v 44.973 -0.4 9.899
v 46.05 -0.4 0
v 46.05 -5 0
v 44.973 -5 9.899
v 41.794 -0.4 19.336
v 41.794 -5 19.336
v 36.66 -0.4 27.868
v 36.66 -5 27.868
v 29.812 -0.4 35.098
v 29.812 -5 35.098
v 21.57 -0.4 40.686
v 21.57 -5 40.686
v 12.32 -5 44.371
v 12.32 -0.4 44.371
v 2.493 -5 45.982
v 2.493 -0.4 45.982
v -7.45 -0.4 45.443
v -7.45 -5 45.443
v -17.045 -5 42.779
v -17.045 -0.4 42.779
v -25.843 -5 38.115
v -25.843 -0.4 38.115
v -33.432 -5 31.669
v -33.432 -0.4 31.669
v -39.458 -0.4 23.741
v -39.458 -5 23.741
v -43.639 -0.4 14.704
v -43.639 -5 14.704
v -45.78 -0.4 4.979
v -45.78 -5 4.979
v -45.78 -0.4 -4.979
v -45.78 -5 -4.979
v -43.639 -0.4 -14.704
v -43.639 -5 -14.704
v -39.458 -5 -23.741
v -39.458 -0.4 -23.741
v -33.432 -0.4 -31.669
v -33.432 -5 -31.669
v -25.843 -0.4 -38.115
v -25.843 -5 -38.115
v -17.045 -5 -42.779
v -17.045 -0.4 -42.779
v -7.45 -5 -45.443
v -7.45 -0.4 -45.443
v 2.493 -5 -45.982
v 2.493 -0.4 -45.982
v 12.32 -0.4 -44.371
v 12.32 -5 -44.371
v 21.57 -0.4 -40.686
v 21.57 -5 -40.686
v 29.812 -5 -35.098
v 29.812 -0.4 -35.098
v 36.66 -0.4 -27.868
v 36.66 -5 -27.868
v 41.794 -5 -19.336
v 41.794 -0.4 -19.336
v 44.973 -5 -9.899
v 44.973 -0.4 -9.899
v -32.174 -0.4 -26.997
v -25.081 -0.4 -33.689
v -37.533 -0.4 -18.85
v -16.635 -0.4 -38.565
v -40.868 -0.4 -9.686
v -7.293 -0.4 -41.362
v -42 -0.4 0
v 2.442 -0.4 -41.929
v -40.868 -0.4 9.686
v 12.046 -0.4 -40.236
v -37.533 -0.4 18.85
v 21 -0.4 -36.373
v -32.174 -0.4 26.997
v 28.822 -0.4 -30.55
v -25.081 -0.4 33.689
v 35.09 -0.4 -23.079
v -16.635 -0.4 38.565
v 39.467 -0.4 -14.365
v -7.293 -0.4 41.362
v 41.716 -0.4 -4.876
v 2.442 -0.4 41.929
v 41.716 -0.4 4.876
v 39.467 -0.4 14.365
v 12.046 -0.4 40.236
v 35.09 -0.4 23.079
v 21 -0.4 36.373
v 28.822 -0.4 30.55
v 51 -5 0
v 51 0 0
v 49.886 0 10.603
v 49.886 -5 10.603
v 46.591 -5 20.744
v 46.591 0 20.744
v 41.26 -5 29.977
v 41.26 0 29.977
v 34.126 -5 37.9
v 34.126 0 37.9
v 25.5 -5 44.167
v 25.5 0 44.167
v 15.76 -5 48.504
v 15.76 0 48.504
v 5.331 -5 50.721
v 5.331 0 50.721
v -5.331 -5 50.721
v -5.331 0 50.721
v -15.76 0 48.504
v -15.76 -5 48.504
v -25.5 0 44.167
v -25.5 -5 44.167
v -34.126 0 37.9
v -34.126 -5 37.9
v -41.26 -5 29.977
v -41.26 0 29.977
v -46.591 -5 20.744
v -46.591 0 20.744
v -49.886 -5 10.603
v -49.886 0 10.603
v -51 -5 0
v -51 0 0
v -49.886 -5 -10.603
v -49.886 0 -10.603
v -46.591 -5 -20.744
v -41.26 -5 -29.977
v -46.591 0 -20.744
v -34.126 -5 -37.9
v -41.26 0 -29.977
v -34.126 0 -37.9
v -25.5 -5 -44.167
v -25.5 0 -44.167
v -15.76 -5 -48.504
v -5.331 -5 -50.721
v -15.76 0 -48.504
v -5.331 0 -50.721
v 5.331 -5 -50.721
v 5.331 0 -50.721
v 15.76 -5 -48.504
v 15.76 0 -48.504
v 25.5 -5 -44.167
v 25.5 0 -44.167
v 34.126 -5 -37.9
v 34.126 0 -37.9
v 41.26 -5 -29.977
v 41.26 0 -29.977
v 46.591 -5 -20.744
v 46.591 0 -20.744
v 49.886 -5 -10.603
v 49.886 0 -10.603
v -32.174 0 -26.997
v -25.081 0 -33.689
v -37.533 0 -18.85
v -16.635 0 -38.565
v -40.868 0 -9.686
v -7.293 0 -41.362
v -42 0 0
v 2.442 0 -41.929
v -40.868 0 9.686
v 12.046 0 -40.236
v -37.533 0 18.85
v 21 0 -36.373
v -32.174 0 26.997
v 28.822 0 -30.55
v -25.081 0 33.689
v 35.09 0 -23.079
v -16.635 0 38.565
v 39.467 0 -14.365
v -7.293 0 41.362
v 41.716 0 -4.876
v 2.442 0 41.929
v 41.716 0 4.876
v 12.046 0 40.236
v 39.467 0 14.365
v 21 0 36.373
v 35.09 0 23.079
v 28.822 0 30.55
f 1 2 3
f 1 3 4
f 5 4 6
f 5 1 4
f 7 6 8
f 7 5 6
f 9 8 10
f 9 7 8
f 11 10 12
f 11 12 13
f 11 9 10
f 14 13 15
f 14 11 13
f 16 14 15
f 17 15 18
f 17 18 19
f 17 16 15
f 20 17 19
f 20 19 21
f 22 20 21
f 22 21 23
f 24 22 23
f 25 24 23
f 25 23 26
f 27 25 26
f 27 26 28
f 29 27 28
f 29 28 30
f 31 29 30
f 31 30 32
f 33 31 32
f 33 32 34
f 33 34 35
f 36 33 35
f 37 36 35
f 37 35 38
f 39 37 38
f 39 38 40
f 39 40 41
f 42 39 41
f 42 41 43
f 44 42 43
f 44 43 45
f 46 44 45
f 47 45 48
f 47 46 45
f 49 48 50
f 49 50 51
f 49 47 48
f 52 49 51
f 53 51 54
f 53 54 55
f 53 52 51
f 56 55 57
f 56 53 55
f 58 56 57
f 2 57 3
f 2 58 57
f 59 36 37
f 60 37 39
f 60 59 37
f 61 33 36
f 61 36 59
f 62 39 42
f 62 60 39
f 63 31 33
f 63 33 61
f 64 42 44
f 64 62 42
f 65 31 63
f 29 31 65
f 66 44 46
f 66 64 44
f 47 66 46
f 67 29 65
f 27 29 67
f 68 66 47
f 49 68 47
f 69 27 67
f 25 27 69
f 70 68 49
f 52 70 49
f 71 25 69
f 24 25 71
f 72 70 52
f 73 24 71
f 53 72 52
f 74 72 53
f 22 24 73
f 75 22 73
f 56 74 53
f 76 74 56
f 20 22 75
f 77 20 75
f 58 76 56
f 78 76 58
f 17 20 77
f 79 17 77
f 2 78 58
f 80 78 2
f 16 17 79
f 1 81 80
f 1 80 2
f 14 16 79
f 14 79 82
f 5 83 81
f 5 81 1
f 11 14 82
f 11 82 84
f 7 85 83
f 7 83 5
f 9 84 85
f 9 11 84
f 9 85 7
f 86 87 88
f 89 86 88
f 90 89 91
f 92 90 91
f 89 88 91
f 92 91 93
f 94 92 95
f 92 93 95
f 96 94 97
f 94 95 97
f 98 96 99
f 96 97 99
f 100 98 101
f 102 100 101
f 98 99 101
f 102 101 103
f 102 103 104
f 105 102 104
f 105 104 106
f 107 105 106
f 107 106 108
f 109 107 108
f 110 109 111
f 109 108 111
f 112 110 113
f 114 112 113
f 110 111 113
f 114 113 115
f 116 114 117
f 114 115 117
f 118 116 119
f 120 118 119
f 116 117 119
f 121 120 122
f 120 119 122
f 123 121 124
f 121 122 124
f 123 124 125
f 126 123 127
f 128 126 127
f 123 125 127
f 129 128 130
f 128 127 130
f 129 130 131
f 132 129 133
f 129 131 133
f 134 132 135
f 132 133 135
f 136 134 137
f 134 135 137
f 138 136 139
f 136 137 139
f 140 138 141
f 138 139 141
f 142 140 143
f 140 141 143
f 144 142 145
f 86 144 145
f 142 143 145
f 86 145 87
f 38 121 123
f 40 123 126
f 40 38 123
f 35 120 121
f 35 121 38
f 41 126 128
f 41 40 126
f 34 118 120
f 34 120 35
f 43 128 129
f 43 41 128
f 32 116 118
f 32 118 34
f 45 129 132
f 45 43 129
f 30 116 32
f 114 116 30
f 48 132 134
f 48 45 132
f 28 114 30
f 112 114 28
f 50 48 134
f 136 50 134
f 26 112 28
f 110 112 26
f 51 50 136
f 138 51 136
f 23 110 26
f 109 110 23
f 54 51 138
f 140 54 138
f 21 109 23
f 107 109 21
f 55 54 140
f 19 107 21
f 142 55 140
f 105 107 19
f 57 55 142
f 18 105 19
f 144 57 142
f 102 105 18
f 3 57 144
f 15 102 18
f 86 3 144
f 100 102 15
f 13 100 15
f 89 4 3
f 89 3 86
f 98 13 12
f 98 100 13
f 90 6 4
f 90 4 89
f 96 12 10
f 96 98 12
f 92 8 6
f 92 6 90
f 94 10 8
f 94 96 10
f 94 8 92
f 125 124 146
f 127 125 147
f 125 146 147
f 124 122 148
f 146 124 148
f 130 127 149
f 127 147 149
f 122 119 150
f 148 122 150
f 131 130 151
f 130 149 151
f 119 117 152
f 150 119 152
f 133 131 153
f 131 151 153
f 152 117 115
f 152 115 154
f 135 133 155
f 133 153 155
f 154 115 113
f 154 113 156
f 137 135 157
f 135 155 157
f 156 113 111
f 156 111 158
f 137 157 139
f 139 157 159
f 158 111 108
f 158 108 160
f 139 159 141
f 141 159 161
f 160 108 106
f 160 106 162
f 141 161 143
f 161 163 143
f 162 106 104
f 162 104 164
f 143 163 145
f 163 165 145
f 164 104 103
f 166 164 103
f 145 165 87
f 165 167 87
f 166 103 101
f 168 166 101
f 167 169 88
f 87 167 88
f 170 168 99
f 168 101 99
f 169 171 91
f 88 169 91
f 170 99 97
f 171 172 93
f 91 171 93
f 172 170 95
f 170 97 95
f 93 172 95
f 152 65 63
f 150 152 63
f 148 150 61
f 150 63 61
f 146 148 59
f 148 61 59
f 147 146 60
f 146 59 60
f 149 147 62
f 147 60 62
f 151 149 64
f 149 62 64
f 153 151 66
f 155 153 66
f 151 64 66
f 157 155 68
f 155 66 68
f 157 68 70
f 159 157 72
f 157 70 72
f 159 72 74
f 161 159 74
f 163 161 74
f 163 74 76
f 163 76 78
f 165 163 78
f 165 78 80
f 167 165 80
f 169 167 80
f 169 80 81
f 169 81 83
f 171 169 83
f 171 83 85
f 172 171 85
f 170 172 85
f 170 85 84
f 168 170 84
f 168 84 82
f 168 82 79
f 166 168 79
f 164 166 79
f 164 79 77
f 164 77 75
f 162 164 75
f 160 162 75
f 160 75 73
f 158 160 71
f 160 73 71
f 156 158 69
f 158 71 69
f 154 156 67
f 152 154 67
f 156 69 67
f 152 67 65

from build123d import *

# Parameters (mm, degrees)
F0_R     = 51
F0_R_2   = 46.05
F1_DEPTH = 5
F2_DEPTH = 0.4
F3_D     = 84


with BuildPart() as f1:
    # F0 (on Front) → F1 (new body)
    with BuildSketch(Plane.XZ):
        Circle(F0_R)
        Circle(F0_R_2, mode=Mode.SUBTRACT)
    extrude(amount=F1_DEPTH)

    # F0 (on Front) → F2 (join)
    with BuildSketch(Plane.XZ):
        Circle(F0_R_2)
    extrude(amount=F2_DEPTH)

    # F3 (through all)
    with Locations(Plane(origin=(0, 0, 0), x_dir=(1, 0, 0), z_dir=(0, 1, 0))):
        with Locations((0, 0)):
            Hole(F3_D / 2)


solid = f1.part
